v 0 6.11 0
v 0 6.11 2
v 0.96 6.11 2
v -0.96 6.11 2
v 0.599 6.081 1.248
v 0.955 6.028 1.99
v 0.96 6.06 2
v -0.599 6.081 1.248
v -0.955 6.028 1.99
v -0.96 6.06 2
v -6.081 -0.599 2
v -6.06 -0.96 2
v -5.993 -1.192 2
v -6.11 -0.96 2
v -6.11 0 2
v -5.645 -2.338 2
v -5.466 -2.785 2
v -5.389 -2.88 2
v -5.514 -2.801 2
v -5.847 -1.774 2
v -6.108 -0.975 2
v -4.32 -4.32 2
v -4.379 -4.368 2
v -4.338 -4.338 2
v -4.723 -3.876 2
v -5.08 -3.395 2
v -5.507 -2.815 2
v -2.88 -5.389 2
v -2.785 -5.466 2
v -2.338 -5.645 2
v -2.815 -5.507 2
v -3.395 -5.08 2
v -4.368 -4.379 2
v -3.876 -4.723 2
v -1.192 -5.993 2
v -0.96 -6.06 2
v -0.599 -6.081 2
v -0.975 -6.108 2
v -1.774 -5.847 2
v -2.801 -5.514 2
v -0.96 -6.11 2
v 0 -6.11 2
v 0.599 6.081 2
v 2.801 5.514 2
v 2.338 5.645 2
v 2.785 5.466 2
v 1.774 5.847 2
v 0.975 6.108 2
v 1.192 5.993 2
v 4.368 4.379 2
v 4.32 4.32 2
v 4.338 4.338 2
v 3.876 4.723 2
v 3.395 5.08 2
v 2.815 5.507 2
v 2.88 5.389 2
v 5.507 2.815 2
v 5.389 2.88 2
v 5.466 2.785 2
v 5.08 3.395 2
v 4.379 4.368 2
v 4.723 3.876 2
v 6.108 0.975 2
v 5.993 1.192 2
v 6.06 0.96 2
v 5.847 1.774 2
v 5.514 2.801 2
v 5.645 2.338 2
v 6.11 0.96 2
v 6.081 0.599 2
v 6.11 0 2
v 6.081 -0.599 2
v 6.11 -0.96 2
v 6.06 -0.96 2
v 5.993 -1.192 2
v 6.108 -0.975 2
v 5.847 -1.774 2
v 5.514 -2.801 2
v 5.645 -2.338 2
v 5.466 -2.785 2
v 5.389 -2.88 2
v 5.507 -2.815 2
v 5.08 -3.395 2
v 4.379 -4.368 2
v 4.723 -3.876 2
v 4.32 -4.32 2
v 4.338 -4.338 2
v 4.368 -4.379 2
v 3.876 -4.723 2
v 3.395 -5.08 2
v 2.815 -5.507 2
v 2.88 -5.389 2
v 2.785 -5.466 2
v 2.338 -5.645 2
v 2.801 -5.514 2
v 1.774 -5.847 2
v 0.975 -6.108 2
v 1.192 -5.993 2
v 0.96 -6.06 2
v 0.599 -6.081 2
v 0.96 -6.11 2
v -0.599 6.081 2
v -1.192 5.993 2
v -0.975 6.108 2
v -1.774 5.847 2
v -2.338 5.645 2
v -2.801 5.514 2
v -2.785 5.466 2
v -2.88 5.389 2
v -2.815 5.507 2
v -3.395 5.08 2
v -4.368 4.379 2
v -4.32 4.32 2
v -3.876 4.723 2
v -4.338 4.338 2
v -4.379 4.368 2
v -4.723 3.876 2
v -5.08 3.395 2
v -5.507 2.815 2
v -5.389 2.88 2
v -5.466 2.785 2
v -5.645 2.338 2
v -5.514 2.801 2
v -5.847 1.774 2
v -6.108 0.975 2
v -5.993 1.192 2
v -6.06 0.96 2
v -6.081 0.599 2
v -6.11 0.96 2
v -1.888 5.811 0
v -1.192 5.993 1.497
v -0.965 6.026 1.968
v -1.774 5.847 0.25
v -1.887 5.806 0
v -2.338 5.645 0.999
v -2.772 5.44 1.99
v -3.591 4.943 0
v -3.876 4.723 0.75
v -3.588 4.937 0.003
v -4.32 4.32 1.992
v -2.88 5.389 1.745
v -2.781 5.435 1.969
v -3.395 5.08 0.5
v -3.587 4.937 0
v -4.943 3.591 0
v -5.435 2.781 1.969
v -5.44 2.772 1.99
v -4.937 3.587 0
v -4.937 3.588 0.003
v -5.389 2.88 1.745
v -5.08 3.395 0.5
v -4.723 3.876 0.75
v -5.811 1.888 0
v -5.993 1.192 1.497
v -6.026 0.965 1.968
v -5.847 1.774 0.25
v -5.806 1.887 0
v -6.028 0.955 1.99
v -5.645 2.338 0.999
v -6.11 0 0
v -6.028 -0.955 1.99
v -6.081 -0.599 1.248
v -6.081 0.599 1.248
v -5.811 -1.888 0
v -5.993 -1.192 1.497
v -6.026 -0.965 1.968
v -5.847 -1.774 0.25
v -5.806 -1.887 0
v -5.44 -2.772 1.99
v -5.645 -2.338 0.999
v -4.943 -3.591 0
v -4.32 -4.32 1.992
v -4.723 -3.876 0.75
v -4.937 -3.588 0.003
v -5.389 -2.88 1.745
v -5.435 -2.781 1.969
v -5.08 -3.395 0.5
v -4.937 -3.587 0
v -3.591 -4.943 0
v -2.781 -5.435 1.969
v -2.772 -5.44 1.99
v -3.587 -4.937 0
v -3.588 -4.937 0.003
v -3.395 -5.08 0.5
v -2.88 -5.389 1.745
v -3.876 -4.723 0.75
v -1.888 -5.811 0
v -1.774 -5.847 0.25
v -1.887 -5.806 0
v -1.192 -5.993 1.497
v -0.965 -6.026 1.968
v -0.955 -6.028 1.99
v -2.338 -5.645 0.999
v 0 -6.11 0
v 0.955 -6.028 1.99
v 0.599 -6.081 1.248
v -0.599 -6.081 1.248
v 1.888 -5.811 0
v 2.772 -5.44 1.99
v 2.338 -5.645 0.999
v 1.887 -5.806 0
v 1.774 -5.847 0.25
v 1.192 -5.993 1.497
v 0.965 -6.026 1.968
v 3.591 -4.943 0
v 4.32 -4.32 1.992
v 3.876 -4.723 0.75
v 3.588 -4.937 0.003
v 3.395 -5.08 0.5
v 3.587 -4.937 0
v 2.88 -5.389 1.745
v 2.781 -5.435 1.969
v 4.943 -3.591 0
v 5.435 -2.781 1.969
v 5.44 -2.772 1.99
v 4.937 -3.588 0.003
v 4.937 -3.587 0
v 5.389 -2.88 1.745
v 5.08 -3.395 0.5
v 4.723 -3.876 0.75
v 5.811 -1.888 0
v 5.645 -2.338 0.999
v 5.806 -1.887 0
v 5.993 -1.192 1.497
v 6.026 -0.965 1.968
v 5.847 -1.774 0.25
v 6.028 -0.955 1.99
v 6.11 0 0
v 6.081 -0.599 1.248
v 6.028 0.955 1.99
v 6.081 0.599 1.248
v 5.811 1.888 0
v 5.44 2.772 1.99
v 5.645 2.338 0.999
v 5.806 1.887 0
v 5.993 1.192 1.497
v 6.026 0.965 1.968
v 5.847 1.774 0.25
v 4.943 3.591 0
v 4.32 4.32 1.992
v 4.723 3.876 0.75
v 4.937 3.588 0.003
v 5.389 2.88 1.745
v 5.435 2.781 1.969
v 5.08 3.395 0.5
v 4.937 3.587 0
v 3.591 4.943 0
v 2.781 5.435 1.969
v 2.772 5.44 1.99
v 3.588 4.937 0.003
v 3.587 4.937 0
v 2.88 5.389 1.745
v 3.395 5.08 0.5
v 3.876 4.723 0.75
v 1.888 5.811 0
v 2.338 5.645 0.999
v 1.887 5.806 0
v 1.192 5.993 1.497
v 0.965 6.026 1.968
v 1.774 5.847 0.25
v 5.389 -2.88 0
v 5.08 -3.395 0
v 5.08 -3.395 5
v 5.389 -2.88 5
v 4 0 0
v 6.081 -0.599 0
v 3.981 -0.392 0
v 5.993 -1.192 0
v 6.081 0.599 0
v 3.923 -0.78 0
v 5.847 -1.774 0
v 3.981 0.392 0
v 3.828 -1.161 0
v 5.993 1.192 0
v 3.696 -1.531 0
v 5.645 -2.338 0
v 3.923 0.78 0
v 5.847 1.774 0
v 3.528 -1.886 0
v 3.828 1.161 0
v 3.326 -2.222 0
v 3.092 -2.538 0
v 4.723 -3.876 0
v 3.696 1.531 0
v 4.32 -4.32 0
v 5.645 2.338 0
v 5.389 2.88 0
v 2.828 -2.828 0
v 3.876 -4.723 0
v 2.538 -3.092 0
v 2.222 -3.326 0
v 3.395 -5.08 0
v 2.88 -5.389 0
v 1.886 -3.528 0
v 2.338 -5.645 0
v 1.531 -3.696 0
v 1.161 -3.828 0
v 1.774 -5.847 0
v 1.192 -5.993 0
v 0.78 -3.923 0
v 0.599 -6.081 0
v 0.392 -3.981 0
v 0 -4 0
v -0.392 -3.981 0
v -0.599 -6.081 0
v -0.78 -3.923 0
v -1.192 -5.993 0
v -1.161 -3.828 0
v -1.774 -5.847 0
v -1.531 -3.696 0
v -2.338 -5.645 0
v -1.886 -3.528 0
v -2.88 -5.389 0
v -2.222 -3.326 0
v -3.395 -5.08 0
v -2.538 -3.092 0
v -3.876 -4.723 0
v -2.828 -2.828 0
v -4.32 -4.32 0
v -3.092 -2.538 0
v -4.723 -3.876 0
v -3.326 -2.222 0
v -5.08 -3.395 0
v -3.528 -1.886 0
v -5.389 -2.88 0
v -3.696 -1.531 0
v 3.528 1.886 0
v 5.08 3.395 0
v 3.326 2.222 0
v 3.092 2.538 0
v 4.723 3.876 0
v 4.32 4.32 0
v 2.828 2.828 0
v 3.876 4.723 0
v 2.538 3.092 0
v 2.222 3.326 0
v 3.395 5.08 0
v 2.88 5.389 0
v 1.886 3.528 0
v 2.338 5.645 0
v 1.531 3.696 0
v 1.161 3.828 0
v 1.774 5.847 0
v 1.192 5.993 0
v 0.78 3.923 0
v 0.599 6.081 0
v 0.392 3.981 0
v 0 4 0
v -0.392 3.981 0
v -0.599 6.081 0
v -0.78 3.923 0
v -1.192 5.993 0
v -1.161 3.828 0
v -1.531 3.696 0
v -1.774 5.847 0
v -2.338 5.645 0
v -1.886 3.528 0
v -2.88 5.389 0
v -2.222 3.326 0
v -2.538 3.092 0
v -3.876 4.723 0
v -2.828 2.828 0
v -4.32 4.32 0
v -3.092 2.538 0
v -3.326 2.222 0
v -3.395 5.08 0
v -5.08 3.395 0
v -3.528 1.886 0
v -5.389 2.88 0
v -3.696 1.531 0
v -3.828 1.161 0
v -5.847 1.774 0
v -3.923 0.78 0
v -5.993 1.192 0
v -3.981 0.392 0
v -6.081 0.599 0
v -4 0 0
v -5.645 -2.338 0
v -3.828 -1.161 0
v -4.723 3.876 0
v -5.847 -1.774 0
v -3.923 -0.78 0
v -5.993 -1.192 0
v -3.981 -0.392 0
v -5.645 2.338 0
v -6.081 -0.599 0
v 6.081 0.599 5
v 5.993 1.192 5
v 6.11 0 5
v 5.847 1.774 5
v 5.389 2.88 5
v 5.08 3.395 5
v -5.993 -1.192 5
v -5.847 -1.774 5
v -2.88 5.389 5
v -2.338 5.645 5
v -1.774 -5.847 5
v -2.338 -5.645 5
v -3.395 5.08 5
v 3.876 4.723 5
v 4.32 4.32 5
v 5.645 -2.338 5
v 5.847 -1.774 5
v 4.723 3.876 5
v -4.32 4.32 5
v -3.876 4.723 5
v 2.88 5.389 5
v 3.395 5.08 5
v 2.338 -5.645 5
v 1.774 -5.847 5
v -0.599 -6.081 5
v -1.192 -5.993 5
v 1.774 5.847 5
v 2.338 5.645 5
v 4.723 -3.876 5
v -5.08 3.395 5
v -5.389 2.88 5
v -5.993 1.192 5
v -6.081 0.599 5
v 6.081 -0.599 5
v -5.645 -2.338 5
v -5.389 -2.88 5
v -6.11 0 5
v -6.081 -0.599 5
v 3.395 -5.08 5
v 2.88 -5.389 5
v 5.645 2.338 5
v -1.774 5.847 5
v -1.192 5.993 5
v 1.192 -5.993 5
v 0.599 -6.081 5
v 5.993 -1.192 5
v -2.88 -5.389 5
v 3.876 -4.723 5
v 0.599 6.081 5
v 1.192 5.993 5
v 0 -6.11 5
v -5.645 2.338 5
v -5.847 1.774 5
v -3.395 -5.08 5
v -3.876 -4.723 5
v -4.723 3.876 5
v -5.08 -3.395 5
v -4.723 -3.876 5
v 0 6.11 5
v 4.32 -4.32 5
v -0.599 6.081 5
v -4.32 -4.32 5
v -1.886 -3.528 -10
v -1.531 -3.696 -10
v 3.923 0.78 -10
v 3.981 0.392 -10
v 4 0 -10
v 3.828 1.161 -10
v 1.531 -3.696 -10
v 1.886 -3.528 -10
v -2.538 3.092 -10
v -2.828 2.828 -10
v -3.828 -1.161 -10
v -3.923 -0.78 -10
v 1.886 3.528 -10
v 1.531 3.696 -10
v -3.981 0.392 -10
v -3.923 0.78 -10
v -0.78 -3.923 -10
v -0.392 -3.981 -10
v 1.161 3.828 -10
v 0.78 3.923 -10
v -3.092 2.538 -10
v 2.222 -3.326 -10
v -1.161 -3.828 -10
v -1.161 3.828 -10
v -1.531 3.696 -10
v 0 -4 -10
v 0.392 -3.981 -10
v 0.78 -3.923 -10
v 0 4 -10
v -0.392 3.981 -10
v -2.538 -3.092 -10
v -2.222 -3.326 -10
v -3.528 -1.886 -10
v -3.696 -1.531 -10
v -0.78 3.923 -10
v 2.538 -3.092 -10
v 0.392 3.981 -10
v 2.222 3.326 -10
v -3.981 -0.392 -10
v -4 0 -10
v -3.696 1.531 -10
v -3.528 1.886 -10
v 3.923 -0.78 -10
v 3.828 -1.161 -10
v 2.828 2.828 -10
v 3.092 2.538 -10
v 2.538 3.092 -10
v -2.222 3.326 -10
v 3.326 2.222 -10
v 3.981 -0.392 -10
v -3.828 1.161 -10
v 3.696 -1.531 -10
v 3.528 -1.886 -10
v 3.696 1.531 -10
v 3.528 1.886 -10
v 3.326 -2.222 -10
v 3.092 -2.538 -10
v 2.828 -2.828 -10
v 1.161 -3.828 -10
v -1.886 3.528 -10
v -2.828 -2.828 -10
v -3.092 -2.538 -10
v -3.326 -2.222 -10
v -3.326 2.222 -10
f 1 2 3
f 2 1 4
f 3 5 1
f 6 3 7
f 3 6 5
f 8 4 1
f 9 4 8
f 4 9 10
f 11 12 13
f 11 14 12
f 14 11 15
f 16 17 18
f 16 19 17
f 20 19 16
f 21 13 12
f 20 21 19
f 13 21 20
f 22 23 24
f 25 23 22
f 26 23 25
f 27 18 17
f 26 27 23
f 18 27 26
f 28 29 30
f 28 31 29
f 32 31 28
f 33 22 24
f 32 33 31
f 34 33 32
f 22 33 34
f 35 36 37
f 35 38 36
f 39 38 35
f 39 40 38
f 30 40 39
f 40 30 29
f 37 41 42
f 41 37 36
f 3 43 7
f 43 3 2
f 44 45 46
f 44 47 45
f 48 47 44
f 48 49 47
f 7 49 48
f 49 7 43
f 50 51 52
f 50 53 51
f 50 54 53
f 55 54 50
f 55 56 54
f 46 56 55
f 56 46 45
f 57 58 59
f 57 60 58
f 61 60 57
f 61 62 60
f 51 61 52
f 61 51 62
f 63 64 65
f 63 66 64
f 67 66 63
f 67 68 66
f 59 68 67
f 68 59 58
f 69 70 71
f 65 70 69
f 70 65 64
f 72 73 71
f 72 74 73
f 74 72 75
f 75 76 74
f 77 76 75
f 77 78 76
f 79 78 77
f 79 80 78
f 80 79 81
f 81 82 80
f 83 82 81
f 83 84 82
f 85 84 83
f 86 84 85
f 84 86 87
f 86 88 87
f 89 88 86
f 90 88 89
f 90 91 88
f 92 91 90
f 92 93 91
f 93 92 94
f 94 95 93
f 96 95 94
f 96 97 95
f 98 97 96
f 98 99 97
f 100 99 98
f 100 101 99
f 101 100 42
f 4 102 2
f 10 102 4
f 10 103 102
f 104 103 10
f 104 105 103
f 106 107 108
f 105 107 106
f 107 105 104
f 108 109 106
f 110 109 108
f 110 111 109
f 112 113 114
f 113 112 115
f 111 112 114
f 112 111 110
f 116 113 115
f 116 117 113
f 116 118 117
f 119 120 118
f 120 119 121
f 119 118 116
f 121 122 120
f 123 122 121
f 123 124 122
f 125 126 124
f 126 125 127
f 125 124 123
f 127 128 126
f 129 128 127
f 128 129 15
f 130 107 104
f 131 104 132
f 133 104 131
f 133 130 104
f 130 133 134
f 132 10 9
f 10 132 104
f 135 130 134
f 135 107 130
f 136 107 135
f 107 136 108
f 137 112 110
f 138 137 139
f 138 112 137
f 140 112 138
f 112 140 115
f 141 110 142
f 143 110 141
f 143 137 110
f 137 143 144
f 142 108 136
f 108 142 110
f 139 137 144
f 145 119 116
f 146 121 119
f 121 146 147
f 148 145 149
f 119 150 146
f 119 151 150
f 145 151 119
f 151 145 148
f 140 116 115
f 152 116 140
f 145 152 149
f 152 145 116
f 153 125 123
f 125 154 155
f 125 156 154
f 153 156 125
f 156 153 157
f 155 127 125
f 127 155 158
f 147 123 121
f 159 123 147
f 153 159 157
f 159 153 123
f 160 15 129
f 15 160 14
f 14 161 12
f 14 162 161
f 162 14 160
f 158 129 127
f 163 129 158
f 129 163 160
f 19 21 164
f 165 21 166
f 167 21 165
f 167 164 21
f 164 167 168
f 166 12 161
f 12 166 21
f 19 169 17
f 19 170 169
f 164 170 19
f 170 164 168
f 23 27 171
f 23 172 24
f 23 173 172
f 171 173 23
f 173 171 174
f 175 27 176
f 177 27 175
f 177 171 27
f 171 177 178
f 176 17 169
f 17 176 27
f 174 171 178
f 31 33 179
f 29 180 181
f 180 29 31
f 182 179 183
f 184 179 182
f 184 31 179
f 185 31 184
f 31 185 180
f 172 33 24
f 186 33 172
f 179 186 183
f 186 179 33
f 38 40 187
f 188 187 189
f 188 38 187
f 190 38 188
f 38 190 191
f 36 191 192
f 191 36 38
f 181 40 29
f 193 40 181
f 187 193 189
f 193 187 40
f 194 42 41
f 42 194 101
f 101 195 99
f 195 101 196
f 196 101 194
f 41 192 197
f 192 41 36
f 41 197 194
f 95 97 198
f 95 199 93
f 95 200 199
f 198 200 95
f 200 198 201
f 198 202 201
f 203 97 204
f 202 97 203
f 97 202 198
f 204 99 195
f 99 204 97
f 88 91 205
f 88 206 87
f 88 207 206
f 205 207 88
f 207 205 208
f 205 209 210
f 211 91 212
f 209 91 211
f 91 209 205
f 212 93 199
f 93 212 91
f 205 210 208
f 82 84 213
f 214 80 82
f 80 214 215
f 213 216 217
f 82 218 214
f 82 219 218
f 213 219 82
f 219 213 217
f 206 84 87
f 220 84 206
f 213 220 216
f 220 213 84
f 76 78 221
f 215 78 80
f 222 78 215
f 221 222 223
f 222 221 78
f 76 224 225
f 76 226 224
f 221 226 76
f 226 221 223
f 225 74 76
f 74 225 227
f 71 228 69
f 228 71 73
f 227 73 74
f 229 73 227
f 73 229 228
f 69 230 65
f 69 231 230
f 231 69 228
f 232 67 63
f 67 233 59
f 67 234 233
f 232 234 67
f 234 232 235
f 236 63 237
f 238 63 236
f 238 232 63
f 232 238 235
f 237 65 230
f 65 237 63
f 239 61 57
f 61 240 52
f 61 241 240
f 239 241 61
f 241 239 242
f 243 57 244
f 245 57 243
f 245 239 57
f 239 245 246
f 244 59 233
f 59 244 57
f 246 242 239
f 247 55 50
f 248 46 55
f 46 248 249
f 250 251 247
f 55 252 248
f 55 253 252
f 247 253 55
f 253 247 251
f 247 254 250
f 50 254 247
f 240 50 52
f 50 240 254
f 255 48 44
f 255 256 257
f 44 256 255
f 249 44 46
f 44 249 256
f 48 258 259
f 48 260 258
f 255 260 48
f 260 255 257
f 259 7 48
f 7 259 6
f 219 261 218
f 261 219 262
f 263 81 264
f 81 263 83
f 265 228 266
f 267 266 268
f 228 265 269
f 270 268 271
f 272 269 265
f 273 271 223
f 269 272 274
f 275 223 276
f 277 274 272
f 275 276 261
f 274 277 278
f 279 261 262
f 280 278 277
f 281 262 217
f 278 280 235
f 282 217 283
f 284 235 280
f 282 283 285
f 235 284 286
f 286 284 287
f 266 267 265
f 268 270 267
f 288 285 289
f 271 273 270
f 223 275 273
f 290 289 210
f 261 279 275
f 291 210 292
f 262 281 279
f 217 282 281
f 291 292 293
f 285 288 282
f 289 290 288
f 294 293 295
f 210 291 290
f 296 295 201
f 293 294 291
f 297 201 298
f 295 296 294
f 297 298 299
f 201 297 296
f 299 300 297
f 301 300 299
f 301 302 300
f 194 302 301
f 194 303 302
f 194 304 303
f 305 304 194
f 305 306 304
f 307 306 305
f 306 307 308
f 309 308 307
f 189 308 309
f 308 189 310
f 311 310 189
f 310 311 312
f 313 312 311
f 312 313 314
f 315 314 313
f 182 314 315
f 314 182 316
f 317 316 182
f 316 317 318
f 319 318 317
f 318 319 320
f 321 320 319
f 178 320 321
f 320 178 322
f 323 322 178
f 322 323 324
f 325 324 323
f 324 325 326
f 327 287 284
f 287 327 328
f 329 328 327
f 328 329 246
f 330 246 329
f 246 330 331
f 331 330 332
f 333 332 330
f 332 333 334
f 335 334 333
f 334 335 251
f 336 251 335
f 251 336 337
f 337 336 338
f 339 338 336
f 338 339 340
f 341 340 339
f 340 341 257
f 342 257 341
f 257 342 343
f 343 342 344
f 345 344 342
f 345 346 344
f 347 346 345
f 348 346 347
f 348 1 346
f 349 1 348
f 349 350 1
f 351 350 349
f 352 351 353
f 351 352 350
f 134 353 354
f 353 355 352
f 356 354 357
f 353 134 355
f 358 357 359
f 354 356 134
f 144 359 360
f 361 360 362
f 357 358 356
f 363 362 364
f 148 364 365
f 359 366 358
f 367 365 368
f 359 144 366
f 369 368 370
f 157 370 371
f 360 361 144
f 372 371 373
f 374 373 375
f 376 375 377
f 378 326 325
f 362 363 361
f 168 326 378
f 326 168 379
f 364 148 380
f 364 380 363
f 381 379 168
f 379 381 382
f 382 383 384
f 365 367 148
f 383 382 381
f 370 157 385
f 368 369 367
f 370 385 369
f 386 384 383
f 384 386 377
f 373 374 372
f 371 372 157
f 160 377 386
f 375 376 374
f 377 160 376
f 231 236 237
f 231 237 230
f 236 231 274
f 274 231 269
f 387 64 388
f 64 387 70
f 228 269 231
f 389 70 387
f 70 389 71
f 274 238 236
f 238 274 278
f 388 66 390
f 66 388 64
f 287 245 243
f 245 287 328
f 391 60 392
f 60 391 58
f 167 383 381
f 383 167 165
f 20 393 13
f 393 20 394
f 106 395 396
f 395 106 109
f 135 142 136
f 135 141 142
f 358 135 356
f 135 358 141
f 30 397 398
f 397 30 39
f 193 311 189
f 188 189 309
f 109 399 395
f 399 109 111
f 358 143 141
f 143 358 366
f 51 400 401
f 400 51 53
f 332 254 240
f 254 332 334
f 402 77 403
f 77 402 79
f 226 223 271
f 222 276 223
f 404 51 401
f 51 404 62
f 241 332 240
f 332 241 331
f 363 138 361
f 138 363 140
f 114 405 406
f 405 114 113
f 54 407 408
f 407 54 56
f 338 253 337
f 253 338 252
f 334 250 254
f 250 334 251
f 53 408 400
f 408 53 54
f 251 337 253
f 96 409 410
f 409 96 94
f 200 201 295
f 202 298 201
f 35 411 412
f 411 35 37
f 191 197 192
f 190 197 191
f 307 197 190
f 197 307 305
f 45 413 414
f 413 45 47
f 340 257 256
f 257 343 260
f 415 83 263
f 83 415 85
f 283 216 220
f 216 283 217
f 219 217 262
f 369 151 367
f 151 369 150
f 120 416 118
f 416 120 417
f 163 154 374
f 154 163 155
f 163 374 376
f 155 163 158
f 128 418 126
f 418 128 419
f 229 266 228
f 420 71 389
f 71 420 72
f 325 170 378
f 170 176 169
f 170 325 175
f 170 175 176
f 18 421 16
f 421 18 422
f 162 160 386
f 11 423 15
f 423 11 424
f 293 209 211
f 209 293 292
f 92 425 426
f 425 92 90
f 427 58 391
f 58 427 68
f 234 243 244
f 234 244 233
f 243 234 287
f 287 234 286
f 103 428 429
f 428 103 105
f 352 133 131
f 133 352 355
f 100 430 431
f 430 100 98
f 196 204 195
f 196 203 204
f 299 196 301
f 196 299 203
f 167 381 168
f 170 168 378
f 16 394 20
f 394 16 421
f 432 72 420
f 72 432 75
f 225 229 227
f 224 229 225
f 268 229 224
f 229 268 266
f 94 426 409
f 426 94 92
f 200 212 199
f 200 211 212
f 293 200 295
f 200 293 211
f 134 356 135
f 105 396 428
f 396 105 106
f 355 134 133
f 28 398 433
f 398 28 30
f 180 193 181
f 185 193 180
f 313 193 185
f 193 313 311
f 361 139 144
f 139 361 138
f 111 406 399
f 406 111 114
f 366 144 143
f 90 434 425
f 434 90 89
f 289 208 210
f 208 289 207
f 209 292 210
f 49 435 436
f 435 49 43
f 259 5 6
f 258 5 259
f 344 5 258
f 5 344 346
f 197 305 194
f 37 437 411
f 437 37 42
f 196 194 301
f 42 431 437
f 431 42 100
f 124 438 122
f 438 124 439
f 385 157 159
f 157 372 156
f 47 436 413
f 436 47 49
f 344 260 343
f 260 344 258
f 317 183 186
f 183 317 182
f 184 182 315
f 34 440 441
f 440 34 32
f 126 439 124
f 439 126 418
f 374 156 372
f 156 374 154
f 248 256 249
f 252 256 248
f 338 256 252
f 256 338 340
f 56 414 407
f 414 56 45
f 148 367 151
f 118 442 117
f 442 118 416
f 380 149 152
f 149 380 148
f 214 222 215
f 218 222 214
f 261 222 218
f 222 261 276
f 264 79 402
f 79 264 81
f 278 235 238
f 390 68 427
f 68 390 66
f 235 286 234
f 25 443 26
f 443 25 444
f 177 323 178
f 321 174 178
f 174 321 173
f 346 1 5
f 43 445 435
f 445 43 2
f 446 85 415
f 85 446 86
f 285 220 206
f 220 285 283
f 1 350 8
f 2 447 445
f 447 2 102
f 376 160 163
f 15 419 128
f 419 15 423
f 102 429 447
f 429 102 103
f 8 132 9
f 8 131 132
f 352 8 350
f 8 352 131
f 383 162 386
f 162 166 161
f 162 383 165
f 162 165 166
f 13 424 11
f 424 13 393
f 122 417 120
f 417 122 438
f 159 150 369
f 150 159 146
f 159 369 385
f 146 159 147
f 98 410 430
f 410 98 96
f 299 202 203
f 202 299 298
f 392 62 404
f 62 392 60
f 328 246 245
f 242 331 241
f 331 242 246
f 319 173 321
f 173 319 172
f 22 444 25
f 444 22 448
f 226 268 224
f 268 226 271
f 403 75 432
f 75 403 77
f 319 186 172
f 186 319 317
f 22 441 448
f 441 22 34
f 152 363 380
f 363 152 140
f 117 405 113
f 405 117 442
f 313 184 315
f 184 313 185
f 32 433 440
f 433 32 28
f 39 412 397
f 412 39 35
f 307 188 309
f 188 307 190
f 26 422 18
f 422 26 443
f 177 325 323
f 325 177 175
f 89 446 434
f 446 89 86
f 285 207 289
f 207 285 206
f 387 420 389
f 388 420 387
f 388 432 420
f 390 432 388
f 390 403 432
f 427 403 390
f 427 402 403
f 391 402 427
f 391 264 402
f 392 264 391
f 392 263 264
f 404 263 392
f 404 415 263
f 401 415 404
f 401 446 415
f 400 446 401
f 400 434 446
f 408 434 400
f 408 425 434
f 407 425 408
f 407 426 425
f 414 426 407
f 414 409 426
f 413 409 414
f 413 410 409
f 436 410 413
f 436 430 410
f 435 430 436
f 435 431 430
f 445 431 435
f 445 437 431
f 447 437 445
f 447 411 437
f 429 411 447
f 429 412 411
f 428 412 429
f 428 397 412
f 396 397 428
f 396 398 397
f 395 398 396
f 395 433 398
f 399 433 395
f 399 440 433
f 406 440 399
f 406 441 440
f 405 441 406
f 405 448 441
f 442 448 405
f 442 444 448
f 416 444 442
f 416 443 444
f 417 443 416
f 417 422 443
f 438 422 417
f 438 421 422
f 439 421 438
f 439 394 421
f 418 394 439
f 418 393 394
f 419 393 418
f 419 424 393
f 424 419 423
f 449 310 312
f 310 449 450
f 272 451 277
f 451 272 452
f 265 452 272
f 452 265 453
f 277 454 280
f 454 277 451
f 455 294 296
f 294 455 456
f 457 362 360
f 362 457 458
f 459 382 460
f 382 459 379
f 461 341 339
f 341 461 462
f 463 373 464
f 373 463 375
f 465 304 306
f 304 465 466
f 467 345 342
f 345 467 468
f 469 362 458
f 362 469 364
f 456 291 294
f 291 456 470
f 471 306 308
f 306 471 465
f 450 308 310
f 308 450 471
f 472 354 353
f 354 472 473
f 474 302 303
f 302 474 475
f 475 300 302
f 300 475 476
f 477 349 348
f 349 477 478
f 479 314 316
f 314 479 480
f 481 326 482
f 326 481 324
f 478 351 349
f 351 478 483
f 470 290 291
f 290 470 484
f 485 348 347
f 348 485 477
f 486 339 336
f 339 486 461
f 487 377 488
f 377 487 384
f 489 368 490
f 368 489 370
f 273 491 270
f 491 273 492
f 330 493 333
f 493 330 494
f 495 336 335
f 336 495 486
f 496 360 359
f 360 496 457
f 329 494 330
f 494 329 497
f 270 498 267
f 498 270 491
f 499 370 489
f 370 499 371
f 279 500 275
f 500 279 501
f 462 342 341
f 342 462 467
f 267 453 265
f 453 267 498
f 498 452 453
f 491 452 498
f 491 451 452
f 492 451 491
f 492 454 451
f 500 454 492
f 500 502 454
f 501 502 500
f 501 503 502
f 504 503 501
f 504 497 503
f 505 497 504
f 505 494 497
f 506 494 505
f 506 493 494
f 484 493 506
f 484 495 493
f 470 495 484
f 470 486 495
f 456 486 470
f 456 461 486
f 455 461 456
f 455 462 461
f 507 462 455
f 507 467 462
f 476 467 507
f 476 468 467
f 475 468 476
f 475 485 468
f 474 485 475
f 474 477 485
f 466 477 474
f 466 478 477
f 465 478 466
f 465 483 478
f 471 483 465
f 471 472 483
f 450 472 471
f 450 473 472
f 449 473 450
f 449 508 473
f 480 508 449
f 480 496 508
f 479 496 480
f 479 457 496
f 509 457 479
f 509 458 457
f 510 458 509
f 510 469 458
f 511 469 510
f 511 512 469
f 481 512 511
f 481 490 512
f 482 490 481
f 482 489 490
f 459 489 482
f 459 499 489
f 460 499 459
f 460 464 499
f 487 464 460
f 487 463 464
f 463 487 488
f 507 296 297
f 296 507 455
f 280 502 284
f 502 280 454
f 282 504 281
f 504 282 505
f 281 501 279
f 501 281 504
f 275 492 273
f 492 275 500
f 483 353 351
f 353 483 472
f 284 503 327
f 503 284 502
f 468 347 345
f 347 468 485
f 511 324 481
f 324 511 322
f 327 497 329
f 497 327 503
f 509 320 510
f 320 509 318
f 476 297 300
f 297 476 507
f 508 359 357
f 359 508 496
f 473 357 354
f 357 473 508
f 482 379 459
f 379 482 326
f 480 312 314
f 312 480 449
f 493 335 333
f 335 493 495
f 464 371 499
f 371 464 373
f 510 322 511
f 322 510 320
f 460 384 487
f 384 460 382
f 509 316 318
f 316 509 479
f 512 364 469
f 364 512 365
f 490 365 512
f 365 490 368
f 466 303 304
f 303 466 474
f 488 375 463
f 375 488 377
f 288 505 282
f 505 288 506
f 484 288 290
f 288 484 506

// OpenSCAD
module timing_pulley(teeth=20, pitch_diameter=12.22, belt_width=5, hub_diameter=8, hub_height=10) {
    tooth_height = 2;
    tooth_width = pitch_diameter * PI / teeth;
    pulley_height = belt_width + hub_height;
    
    module tooth() {
        translate([0, pitch_diameter / 2, 0])
        rotate([90, 0, 0])
        linear_extrude(height=belt_width)
        polygon(points=[[0, 0], [tooth_width / 2, tooth_height], [-tooth_width / 2, tooth_height]]);
    }
    
    union() {
        // Create the main pulley body
        cylinder(d=pitch_diameter, h=belt_width, $fn=64);
        
        // Add teeth around the pulley
        for (i = [0:teeth-1]) {
            rotate([0, 0, i * 360 / teeth])
            tooth();
        }
        
        // Add the hub
        translate([0, 0, -hub_height])
        cylinder(d=hub_diameter, h=pulley_height, $fn=64);
    }
}

timing_pulley();
